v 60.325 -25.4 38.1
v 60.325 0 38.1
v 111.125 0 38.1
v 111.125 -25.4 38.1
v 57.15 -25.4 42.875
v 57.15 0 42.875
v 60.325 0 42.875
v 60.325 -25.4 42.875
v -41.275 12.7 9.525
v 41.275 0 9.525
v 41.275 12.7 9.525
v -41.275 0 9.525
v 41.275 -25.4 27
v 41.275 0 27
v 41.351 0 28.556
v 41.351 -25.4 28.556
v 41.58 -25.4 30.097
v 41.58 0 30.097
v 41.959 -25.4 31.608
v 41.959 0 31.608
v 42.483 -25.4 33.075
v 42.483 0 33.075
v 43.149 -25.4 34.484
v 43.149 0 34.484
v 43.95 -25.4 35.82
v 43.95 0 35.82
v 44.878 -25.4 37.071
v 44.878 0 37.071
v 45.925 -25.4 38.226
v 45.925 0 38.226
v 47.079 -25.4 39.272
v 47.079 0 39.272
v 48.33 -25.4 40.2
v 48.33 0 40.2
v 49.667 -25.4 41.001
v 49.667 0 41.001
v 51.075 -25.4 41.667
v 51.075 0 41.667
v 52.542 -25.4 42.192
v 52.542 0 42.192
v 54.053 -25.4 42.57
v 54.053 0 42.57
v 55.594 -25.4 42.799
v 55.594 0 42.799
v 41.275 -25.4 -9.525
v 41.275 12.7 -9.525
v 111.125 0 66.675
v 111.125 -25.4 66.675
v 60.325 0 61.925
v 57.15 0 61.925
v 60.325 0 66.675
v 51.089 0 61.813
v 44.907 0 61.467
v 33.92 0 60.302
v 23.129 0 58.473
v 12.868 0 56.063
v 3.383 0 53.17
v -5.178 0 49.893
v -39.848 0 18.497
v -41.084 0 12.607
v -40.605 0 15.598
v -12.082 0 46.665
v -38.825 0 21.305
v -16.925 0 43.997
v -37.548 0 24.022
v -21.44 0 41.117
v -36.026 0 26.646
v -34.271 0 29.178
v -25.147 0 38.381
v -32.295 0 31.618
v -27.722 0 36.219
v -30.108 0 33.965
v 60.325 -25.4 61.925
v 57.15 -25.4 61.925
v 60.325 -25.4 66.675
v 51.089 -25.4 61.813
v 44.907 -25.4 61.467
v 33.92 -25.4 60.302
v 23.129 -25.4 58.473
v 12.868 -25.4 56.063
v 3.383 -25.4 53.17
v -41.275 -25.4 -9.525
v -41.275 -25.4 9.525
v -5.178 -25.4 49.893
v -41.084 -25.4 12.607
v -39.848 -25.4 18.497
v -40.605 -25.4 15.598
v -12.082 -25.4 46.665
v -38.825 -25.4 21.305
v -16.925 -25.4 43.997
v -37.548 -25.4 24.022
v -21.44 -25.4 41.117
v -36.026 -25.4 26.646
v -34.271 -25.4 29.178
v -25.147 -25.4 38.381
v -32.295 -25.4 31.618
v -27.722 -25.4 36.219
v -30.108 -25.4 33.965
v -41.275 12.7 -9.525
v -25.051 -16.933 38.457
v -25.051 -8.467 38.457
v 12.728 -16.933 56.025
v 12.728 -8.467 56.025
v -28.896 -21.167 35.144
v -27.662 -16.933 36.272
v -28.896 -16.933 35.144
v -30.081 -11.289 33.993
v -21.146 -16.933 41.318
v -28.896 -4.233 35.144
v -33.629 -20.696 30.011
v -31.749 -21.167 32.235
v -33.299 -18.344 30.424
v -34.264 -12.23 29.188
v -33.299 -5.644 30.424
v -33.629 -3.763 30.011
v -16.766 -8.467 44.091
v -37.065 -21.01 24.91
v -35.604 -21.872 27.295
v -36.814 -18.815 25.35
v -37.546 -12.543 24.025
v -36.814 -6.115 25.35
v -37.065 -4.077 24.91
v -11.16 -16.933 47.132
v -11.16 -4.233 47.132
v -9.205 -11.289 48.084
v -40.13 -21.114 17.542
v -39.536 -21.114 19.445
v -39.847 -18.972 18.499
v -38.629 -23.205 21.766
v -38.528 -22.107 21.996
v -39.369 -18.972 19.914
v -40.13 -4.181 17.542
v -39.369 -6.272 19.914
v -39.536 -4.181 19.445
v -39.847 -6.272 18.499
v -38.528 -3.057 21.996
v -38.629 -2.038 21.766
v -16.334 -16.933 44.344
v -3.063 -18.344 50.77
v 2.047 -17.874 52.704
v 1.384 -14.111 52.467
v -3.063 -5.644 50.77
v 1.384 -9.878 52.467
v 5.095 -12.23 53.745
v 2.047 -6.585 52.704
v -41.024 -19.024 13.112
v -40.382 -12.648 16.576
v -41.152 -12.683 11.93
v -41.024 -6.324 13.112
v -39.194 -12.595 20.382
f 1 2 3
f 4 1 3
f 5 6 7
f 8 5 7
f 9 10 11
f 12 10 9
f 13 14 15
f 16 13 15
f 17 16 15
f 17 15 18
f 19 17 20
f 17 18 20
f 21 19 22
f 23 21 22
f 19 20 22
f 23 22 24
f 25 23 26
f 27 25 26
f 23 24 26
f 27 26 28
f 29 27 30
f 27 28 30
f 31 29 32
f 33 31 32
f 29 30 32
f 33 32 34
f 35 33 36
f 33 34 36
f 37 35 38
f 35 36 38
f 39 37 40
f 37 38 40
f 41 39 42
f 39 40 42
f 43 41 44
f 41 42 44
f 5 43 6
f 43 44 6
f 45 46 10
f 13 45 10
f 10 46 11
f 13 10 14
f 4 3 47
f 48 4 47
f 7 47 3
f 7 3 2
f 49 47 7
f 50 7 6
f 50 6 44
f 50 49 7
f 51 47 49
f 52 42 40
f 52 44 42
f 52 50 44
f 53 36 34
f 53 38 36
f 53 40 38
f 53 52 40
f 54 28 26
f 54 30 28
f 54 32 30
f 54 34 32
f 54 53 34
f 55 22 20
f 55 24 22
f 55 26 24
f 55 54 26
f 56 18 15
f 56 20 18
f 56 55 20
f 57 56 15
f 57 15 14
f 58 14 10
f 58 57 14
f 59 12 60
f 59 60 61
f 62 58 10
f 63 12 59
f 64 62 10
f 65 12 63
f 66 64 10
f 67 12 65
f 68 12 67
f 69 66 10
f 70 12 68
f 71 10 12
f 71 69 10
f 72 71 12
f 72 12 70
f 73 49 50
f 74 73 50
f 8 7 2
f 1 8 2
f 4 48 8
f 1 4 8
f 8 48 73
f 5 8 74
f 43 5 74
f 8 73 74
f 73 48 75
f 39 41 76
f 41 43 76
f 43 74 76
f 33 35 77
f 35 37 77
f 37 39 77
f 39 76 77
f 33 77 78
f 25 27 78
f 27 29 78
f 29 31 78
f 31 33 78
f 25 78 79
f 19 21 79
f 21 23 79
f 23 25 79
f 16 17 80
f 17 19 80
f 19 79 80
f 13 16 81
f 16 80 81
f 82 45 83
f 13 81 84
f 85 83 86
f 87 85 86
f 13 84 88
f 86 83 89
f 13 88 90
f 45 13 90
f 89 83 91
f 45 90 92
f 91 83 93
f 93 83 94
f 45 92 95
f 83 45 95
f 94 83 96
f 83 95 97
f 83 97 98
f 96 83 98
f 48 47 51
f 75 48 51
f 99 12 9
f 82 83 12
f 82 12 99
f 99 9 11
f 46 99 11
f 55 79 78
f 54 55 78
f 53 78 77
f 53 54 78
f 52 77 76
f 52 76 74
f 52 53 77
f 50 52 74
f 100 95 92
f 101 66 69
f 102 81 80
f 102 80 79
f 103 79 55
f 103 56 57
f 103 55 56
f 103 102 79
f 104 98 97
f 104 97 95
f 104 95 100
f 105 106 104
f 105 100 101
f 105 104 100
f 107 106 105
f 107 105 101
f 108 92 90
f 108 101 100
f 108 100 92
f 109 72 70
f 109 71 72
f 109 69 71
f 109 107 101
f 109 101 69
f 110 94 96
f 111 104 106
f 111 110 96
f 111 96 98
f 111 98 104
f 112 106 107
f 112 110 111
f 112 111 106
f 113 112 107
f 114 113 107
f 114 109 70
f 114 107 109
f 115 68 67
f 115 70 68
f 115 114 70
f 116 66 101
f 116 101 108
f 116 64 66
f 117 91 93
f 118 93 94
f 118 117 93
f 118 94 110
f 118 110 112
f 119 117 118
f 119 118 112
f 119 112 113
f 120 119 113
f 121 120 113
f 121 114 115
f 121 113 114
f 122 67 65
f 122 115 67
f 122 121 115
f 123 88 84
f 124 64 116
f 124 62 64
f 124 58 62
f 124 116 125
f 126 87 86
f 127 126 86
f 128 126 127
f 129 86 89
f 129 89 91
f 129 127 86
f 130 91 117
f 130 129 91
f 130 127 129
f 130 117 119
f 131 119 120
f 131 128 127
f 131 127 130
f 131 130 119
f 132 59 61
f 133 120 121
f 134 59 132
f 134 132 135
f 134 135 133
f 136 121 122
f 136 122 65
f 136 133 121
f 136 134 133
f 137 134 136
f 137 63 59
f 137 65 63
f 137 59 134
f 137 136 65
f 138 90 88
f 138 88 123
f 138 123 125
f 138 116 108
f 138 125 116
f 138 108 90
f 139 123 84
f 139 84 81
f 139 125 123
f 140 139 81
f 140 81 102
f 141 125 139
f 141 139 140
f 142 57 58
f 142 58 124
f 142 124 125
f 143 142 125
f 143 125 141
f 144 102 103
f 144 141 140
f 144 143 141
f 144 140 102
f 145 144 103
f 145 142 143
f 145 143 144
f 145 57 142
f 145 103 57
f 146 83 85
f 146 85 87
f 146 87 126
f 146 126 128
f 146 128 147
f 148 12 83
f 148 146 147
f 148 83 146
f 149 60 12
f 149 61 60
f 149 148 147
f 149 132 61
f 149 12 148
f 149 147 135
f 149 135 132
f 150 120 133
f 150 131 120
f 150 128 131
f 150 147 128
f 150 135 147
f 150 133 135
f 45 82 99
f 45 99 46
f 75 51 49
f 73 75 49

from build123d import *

# Parameters (mm, degrees)
F2_DEPTH = 12.7
F3_DEPTH = 25.4


# Not quite as in the source:
# - a feature names something its author has since deleted; it is built from what else it names


with BuildPart() as f2:
    # F0 (on Front) → F2 (new body, symmetric)
    with BuildSketch(Plane.XZ):
        Polygon((22.225, 9.525), (-41.275, 9.525), (-41.275, -9.525), (41.275, -9.525), (41.275, 9.525), align=None)
    extrude(amount=F2_DEPTH, both=True)

    # F0 (on Front) → F3 (join)
    with BuildSketch(Plane.XZ):
        with BuildLine():
            add(Edge.make_bspline(
                [(-41.275, 9.525), (-40.7984927297, 44.0375059843), (14.3764037639, 61.959747225), (57.15, 61.9252)],
                knots=[0, 0, 0, 0, 111.5045361635, 111.5045361635, 111.5045361635, 111.5045361635], degree=3))
            Line((-41.275, 9.525), (22.225, 9.525))
            Line((22.225, 9.525), (22.225, 27.0002))
            ThreePointArc((22.225, 27.0002), (32.4542956671, 51.6959043329), (57.15, 61.9252))
        make_face()
        Polygon((22.225, 9.525), (-41.275, 9.525), (-41.275, -9.525), (41.275, -9.525), (41.275, 9.525), align=None)
        with BuildLine():
            Line((22.225, 27.0002), (22.225, 9.525))
            Line((22.225, 9.525), (41.275, 9.525))
            Line((41.275, 9.525), (41.275, 27.0002))
            ThreePointArc((41.275, 27.0002), (45.9246798487, 38.2255201513), (57.15, 42.8752))
            Line((57.15, 42.8752), (60.325, 42.8752))
            Line((60.325, 42.8752), (60.325, 61.9252))
            Line((60.325, 61.9252), (57.15, 61.9252))
            ThreePointArc((57.15, 61.9252), (32.4542956671, 51.6959043329), (22.225, 27.0002))
        make_face()
        Polygon((74.2425137572, 61.9252), (60.325, 61.9252), (60.325, 42.8752), (74.2425137572, 42.8752), (85.725, 42.8752), (85.725, 61.9252), align=None)
        Polygon((60.325, 66.675), (60.325, 61.9252), (74.2425137572, 61.9252), (85.725, 61.9252), (85.725, 66.675), align=None)
        Polygon((74.2425137572, 42.8752), (60.325, 42.8752), (60.325, 38.1), (85.725, 38.1), (85.725, 42.8752), align=None)
        Polygon((111.125, 66.675), (85.725, 66.675), (85.725, 61.9252), (85.725, 42.8752), (85.725, 38.1), (111.125, 38.1), align=None)
    extrude(amount=F3_DEPTH)


solid = f2.part
